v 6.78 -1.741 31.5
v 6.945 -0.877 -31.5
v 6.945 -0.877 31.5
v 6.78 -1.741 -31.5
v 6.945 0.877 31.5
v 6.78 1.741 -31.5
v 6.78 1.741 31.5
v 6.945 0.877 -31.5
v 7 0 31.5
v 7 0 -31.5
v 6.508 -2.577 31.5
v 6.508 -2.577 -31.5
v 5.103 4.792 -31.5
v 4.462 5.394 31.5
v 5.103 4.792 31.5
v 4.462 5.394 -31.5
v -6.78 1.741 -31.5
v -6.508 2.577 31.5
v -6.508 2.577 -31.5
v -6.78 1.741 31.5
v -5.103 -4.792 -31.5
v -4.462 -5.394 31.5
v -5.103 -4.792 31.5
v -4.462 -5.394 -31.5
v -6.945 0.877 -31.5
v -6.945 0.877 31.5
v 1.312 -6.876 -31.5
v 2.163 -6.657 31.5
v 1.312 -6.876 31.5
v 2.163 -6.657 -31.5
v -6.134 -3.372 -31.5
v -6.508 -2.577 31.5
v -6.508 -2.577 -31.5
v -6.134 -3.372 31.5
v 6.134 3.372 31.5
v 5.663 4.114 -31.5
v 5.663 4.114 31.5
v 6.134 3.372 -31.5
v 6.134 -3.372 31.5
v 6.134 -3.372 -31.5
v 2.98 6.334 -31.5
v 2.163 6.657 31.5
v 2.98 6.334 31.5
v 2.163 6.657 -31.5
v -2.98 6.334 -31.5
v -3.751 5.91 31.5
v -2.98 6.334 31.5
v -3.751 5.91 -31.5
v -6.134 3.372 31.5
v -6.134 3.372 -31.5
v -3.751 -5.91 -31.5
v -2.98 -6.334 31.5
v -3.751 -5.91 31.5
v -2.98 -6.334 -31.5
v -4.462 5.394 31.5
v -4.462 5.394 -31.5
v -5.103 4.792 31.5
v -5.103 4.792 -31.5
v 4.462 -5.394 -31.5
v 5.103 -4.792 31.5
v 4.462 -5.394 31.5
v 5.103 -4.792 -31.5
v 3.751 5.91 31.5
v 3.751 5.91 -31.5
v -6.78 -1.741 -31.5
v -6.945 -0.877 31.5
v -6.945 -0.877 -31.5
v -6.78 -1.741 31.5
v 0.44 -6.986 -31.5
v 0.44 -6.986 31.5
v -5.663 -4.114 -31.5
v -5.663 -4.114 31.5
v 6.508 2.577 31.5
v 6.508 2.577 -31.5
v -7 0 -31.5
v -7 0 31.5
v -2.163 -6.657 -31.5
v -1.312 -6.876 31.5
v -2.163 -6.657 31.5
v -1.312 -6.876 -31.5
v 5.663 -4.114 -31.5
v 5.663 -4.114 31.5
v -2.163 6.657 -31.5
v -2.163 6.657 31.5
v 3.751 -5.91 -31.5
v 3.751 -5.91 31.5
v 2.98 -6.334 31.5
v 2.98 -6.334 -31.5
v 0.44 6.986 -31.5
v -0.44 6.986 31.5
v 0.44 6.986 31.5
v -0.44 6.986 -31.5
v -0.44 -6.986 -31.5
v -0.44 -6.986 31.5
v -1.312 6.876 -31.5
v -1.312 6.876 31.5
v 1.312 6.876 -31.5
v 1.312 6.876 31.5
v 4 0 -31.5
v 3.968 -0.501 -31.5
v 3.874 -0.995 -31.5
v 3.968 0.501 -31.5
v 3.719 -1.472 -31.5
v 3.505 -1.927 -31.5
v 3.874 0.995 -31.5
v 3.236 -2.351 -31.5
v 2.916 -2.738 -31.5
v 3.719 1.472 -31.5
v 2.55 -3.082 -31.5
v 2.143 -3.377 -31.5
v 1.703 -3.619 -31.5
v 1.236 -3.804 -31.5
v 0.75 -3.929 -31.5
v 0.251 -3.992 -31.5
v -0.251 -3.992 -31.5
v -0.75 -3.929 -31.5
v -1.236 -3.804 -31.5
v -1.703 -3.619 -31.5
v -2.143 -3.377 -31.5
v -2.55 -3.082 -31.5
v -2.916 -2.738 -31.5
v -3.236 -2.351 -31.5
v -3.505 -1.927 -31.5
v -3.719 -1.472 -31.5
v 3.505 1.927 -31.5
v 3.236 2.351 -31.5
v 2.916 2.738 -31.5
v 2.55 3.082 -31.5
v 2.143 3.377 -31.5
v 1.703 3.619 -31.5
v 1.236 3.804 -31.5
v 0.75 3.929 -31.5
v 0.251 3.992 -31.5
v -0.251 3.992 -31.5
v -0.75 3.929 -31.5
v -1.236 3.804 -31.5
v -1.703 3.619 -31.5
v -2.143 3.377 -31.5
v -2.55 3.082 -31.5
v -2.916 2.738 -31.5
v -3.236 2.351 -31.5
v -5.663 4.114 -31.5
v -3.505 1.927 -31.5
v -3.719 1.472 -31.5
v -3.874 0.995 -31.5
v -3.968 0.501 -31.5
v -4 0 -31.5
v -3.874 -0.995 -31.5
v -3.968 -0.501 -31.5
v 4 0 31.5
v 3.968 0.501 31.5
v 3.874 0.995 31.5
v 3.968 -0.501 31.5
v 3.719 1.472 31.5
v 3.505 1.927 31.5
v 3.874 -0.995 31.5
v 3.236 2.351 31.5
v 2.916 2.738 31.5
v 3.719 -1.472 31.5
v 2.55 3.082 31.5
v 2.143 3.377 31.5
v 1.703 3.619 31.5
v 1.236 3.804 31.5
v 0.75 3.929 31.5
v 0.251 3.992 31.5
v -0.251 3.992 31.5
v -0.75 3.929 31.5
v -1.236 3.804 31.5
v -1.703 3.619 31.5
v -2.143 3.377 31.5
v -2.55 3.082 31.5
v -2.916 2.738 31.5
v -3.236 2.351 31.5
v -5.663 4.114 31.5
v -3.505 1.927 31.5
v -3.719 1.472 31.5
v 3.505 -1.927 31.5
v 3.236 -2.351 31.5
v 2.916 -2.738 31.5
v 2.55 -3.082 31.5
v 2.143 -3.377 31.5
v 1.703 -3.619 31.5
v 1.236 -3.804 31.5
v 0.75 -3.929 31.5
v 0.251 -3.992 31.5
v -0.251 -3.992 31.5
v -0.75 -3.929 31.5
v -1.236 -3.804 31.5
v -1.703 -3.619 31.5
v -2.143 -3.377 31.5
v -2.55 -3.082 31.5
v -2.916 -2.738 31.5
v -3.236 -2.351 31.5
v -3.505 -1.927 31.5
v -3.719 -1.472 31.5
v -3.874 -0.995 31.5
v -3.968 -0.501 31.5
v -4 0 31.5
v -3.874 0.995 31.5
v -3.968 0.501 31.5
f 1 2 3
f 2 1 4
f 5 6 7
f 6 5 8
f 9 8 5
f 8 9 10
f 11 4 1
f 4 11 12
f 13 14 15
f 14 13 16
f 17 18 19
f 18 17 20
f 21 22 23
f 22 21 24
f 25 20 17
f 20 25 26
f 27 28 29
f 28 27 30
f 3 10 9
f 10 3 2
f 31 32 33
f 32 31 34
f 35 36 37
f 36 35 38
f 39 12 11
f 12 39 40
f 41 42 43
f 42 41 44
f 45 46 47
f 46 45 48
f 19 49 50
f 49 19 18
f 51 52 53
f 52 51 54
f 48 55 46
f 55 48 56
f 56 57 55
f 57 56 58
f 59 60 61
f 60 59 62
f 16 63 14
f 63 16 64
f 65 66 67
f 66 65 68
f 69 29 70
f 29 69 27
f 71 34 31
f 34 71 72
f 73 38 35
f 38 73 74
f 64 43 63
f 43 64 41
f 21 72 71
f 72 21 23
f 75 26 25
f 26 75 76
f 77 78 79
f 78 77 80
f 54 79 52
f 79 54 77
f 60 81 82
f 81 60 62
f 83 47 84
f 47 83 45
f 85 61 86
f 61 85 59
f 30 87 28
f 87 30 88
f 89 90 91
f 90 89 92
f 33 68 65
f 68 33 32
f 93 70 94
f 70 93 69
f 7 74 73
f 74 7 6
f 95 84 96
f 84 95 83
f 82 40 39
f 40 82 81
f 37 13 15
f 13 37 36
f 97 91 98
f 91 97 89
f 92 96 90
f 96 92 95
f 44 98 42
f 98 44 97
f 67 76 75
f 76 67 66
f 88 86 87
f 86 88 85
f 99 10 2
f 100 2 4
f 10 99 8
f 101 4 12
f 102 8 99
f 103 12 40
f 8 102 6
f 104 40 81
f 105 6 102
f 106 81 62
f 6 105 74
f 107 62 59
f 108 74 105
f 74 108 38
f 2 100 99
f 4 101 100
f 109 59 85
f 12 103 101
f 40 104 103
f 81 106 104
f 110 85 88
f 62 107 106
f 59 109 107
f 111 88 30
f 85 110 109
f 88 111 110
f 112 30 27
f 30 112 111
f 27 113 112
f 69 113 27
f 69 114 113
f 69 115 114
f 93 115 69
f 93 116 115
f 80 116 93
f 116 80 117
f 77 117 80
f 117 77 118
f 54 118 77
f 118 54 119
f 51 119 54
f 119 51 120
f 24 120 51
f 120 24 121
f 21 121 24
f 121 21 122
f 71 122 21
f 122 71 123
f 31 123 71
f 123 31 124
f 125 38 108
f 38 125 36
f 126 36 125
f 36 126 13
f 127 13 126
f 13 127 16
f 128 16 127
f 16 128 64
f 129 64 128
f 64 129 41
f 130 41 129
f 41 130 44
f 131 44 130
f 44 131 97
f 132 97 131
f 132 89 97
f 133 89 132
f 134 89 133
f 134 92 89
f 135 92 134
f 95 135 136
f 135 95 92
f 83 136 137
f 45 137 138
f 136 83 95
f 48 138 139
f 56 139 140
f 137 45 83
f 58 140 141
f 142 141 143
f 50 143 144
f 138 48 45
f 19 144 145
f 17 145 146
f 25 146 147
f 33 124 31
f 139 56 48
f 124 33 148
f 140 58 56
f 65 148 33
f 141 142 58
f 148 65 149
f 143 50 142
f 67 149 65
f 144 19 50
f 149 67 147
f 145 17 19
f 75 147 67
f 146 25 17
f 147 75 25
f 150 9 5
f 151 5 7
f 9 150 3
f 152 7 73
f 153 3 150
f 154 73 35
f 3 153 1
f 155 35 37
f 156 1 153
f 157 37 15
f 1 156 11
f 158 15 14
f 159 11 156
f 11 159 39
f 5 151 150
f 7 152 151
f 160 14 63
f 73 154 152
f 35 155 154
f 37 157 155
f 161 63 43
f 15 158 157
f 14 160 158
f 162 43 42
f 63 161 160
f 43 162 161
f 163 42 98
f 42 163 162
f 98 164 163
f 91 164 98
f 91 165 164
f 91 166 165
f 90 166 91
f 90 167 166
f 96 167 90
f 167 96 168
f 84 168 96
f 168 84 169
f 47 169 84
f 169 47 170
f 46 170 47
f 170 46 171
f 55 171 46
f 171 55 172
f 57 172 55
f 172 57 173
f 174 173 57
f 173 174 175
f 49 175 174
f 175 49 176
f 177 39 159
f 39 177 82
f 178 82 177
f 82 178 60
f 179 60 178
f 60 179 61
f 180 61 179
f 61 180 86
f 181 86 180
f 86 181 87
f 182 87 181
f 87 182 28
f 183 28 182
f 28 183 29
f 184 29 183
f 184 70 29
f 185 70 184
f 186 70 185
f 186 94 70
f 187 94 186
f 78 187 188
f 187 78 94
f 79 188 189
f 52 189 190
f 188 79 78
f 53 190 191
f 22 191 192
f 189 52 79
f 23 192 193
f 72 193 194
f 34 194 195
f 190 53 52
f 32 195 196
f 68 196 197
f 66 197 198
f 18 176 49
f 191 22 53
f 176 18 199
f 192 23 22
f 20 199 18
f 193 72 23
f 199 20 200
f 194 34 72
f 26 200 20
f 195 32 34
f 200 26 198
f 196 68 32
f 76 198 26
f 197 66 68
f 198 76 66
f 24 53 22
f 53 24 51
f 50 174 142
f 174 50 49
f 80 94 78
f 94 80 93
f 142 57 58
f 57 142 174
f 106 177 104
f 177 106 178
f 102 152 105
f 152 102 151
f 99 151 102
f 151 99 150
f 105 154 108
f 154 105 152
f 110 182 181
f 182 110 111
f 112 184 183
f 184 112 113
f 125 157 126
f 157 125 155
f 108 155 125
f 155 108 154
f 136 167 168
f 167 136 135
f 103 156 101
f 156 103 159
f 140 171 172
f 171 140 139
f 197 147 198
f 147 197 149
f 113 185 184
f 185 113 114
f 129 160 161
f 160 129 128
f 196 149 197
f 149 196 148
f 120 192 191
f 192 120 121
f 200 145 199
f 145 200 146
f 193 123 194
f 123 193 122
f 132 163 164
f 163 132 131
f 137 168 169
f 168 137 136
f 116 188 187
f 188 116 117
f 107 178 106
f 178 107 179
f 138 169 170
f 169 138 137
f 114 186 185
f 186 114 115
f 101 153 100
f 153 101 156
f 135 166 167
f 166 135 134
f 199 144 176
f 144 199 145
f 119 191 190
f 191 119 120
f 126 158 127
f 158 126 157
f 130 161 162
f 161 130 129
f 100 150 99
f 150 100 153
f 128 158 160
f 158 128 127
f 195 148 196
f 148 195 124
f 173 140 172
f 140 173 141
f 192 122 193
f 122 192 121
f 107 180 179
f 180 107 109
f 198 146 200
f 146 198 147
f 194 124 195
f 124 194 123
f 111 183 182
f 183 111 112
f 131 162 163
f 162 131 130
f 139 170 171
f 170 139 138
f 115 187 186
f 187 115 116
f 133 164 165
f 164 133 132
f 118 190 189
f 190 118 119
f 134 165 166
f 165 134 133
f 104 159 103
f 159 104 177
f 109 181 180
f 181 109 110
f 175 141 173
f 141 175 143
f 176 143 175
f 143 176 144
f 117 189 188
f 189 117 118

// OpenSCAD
$fn = 50;


difference() {
	union() {
		translate(v = [0, 0, -31.5000000000]) {
			cylinder(h = 63, r = 7.0000000000);
		}
	}
	union() {
		translate(v = [0, 0, -100.0000000000]) {
			cylinder(h = 200, r = 4.0000000000);
		}
	}
}
